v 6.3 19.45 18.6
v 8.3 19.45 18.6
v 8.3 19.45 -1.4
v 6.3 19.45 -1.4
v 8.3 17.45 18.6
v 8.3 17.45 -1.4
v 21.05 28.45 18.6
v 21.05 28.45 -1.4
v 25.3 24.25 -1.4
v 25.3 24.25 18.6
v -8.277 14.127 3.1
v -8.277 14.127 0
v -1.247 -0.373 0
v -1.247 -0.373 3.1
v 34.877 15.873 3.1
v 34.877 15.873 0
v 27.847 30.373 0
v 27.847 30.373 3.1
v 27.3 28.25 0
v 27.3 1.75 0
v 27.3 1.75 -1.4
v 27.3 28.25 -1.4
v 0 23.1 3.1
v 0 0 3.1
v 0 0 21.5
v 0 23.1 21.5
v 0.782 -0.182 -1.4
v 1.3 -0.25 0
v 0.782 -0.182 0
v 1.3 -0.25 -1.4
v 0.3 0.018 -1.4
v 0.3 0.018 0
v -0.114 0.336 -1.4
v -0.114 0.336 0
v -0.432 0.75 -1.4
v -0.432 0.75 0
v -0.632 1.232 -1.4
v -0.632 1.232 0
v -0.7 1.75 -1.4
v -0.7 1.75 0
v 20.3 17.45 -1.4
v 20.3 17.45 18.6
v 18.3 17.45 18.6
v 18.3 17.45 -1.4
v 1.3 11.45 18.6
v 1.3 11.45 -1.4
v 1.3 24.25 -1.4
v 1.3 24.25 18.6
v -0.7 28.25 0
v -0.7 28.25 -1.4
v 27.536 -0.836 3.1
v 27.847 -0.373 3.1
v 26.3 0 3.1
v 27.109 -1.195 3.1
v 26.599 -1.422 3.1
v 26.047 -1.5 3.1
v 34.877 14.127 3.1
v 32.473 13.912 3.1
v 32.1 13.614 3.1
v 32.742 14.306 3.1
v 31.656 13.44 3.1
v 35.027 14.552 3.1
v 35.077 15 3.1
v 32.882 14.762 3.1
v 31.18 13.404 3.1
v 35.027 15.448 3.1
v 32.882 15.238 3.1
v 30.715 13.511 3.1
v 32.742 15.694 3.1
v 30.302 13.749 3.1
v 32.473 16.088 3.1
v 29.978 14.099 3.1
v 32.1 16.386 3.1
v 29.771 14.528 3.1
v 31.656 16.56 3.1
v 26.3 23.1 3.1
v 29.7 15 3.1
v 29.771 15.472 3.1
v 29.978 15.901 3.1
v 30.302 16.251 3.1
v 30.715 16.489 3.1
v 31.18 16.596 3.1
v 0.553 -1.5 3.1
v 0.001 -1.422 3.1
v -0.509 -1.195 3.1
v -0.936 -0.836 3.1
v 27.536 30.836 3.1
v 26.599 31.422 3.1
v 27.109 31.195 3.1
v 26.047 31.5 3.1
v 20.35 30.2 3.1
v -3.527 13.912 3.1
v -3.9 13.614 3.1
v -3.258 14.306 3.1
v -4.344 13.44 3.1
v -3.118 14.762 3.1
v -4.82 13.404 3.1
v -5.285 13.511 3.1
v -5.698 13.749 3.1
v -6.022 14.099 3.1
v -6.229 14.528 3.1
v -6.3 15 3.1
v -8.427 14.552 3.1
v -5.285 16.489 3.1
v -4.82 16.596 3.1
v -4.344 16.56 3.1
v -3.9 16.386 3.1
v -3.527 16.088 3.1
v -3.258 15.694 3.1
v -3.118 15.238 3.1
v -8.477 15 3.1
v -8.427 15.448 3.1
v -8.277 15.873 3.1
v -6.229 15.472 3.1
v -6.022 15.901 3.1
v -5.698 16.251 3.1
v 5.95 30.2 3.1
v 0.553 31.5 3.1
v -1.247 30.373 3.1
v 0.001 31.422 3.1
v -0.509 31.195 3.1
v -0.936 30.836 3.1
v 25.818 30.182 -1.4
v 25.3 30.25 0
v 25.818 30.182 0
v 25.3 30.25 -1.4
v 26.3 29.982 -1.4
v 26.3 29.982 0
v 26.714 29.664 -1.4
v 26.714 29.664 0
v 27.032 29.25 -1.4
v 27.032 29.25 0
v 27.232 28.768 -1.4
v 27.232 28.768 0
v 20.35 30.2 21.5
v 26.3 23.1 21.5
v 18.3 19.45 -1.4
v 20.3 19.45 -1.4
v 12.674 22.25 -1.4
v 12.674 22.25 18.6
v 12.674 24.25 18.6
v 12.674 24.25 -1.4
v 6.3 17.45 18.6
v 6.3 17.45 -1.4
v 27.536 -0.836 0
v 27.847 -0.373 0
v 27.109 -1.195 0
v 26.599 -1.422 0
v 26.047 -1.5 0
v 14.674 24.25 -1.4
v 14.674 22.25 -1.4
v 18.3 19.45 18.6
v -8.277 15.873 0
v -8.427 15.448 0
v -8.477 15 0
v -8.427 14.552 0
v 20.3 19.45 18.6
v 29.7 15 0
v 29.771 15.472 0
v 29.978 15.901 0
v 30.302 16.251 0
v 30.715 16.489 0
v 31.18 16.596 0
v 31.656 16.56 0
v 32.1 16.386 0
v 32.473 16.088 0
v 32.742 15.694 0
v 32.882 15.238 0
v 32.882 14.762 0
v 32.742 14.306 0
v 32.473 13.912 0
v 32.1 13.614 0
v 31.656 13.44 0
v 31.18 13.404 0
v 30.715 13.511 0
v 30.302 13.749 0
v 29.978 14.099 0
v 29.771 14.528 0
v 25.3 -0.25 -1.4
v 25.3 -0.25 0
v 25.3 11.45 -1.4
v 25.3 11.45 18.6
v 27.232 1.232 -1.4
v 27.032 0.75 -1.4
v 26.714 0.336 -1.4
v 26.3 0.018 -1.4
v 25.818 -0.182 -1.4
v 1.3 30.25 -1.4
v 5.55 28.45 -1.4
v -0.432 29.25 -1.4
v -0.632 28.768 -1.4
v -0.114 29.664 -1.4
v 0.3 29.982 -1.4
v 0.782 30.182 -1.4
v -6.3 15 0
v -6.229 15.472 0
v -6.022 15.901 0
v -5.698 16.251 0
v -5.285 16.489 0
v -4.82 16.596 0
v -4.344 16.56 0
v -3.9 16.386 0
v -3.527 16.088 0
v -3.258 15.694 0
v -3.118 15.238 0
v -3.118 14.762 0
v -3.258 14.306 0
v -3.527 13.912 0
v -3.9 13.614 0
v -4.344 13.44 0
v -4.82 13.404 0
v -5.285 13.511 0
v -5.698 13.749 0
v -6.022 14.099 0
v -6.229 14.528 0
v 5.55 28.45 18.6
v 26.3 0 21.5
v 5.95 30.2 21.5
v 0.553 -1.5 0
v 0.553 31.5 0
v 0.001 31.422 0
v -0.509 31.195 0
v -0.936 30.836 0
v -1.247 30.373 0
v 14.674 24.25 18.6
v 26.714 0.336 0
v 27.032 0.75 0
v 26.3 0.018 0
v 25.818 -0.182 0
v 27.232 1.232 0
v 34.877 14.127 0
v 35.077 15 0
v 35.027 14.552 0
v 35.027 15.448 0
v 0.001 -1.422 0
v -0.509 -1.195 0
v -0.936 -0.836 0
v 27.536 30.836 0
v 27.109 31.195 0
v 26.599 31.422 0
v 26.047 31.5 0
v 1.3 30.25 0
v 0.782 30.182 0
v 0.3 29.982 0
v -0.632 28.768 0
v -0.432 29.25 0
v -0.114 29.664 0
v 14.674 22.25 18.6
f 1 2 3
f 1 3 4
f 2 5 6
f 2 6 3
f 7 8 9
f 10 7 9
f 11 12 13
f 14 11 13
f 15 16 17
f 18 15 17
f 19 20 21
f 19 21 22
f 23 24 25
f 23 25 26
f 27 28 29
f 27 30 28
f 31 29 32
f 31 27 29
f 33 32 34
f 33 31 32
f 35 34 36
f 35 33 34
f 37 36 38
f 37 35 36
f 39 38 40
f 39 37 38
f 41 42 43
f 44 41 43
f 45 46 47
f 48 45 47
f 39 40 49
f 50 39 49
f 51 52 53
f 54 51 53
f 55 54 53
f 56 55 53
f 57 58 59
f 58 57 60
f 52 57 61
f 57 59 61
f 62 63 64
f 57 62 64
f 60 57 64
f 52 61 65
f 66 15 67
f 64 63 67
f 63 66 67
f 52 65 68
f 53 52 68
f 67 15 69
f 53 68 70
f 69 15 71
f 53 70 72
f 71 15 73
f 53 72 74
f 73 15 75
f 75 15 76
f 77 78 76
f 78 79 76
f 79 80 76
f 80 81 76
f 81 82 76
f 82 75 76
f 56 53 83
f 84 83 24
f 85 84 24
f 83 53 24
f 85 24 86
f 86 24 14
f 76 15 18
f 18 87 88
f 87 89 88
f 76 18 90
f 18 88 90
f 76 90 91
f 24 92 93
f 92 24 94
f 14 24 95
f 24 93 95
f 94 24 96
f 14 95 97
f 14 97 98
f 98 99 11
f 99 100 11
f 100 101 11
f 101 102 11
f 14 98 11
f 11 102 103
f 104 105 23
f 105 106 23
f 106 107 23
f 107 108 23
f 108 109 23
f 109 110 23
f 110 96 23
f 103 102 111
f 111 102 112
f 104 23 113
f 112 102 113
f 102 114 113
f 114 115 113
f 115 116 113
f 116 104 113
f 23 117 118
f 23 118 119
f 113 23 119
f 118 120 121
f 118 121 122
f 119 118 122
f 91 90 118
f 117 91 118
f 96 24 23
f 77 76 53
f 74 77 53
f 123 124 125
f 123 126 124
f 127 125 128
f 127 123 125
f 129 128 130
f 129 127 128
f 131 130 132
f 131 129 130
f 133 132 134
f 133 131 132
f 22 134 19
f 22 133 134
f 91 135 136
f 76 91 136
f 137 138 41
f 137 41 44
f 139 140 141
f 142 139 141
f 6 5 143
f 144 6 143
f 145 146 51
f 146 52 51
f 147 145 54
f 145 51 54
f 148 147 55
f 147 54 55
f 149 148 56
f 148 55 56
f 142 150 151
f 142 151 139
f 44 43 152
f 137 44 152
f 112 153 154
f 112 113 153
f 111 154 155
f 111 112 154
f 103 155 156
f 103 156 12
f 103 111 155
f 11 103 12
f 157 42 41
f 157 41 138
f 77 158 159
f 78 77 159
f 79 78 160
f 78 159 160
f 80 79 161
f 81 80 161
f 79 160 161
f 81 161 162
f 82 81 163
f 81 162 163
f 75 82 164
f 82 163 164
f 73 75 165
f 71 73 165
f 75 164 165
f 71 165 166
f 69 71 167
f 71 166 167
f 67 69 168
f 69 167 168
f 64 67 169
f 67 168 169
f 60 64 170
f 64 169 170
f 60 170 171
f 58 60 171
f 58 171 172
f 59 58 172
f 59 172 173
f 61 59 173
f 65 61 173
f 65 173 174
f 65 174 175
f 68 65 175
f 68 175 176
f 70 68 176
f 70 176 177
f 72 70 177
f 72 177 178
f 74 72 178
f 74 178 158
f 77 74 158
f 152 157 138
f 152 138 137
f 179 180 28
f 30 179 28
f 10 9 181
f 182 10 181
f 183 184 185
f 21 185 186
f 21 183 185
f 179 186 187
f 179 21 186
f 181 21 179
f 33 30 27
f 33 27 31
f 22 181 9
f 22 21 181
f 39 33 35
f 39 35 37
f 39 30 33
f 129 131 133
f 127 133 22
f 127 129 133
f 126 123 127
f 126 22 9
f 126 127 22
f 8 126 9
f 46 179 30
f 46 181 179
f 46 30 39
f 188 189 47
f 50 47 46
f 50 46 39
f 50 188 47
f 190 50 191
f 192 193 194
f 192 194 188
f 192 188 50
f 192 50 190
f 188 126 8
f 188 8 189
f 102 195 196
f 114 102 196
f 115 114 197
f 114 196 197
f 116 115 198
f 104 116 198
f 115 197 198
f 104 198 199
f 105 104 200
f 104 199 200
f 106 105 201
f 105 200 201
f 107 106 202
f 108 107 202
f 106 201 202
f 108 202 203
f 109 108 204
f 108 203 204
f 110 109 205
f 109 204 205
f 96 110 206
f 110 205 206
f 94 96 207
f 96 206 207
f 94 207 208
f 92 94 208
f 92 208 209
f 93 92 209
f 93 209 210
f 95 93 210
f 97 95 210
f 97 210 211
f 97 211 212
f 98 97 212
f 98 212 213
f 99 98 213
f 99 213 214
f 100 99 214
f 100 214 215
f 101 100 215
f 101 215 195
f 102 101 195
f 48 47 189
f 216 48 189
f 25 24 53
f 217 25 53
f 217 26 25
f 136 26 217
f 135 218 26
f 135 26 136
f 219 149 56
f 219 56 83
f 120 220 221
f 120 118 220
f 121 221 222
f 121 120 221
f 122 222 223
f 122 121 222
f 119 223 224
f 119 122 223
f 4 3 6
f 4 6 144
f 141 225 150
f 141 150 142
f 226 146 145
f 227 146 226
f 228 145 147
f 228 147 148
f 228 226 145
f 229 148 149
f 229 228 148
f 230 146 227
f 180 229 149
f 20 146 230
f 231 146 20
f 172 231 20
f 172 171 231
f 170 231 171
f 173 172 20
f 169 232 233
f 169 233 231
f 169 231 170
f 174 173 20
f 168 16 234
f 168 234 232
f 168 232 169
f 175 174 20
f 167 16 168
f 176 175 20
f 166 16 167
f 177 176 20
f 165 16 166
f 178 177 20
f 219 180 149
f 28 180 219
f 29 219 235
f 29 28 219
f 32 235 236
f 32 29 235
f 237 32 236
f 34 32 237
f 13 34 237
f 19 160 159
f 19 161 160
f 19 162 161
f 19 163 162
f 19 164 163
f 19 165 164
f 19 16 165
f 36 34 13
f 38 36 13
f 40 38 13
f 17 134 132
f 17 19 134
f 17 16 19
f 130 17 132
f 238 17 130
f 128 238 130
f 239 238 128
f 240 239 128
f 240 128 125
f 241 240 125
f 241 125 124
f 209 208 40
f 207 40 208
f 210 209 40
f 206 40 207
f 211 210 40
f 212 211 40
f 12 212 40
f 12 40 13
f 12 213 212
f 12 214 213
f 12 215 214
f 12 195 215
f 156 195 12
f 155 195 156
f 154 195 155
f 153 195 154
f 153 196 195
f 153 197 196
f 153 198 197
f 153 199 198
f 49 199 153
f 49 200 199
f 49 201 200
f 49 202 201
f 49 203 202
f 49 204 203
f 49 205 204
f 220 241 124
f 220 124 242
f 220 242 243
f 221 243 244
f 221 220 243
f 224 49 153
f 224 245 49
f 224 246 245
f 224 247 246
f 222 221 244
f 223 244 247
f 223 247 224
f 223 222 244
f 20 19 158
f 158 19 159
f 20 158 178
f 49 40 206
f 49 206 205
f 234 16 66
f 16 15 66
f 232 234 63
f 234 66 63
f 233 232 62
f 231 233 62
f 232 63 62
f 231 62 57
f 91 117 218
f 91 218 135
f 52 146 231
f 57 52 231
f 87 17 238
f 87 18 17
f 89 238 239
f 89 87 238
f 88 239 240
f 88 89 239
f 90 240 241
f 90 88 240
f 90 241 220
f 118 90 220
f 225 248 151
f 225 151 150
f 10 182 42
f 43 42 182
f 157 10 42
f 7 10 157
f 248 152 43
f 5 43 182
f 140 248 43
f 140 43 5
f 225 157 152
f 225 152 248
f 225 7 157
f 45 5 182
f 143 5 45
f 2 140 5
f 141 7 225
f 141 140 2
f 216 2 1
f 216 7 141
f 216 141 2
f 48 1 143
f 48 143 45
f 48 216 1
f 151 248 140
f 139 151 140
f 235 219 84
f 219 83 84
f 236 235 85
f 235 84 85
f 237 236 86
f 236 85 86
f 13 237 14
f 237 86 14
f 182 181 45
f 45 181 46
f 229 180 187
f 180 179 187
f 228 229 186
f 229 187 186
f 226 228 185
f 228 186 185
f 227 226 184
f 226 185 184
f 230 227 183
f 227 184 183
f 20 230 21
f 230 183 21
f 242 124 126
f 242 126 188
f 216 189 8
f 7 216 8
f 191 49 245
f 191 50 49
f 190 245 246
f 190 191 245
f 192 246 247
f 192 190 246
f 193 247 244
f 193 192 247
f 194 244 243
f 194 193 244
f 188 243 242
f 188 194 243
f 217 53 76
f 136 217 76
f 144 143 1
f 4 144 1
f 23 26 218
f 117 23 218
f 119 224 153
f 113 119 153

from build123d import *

# Parameters (mm, degrees)
SKETCH1_W           = 26.3
SKETCH1_H           = 30.2
BOSS_EXTRUDE1_DEPTH = 21.5
CUT_EXTRUDE1_DEPTH  = 26
SKETCH3_W           = 44
SKETCH3_H           = 33
BOSS_EXTRUDE2_DEPTH = 3.1
CUT_EXTRUDE2_DEPTH  = 3.1
FILLET1_R           = 2
SKETCH5_W           = 28
SKETCH5_H           = 30.5
BOSS_EXTRUDE3_DEPTH = 1.4
FILLET2_R           = 2
SKETCH6_W           = 2
SKETCH6_H           = 2
CUT_EXTRUDE3_DEPTH  = 20
SKETCH7_R           = 1.6
CUT_EXTRUDE4_DEPTH  = 20


with BuildPart() as part:
    # Sketch1 → Boss-Extrude1 (new body)
    with BuildSketch(Plane.XY):
        with Locations((13.15, 15.1)):
            Rectangle(SKETCH1_W, SKETCH1_H)
    extrude(amount=BOSS_EXTRUDE1_DEPTH)

    # Sketch2 → Cut-Extrude1 (cut)
    with BuildSketch(Plane.XY.offset(21.5)):
        Polygon((0, 30.2), (0, 23.1), (5.95, 30.2), align=None)
        Polygon((20.35, 30.2), (26.3, 23.1), (26.3, 30.2), align=None)
    extrude(amount=-CUT_EXTRUDE1_DEPTH, mode=Mode.SUBTRACT)

    # Sketch3 → Boss-Extrude2 (add)
    with BuildSketch(Plane(origin=(0, 0, 0), x_dir=(-1, 0, 0), z_dir=(0, 0, -1))):
        with Locations((-13.3, 15)):
            Rectangle(SKETCH3_W, SKETCH3_H)
    extrude(amount=-BOSS_EXTRUDE2_DEPTH)

    # Sketch4 → Cut-Extrude2 (cut)
    with BuildSketch(Plane(origin=(0, 0, 0), x_dir=(-1, 0, 0), z_dir=(0, 0, -1))):
        Polygon((-35.3, 15), (-27.3, 31.5), (-35.3, 31.5), align=None)
        Polygon((8.7, 31.5), (0.7, 31.5), (8.7, 15), align=None)
        Polygon((8.7, -1.5), (8.7, 15), (0.7, -1.5), align=None)
        Polygon((-27.3, -1.5), (-35.3, 15), (-35.3, -1.5), align=None)
    extrude(amount=-CUT_EXTRUDE2_DEPTH, mode=Mode.SUBTRACT)

    # Fillet1
    fillet1_edges = [part.edges().sort_by_distance(p)[0] for p in [
        (27.3, 31.5, 1.55),
        (35.3, 15, 1.55),
        (-0.7, 31.5, 1.55),
        (-8.7, 15, 1.55),
        (-0.7, -1.5, 1.55),
        (27.3, -1.5, 1.55),
    ]]
    fillet(fillet1_edges, radius=FILLET1_R)

    # Sketch5 → Boss-Extrude3 (add)
    with BuildSketch(Plane(origin=(0, 0, 0), x_dir=(-1, 0, 0), z_dir=(0, 0, -1))):
        with Locations((-13.3, 15)):
            Rectangle(SKETCH5_W, SKETCH5_H)
    extrude(amount=BOSS_EXTRUDE3_DEPTH)

    # Fillet2
    fillet2_edges = [part.edges().sort_by_distance(p)[0] for p in [
        (-0.7, -0.25, -0.7),
        (-0.7, 30.25, -0.7),
        (27.3, 30.25, -0.7),
        (27.3, -0.25, -0.7),
    ]]
    fillet(fillet2_edges, radius=FILLET2_R)

    # Sketch6 → Cut-Extrude3 (cut)
    with BuildSketch(Plane(origin=(0, 0, -1.4), x_dir=(-1, 0, 0), z_dir=(0, 0, -1))):
        Polygon((-25.3, 24.25), (-25.3, 11.45), (-1.3, 11.45), (-1.3, 24.25), (-5.55, 28.45), (-21.05, 28.45), align=None)
        with Locations((-19.3, 18.45)):
            Rectangle(SKETCH6_W, SKETCH6_H, mode=Mode.SUBTRACT)
        with Locations((-7.3, 18.45)):
            Rectangle(SKETCH6_W, SKETCH6_H, mode=Mode.SUBTRACT)
        with Locations((-13.673670814, 23.25)):
            Rectangle(SKETCH6_W, SKETCH6_H, mode=Mode.SUBTRACT)
    extrude(amount=-CUT_EXTRUDE3_DEPTH, mode=Mode.SUBTRACT)

    # Sketch7 → Cut-Extrude4 (cut)
    with BuildSketch(Plane(origin=(0, 0, 0), x_dir=(-1, 0, 0), z_dir=(0, 0, -1))):
        with Locations((-31.3, 15)):
            Circle(SKETCH7_R)
        with Locations((4.7, 15)):
            Circle(SKETCH7_R)
    extrude(amount=-CUT_EXTRUDE4_DEPTH, mode=Mode.SUBTRACT)


solid = part.part
